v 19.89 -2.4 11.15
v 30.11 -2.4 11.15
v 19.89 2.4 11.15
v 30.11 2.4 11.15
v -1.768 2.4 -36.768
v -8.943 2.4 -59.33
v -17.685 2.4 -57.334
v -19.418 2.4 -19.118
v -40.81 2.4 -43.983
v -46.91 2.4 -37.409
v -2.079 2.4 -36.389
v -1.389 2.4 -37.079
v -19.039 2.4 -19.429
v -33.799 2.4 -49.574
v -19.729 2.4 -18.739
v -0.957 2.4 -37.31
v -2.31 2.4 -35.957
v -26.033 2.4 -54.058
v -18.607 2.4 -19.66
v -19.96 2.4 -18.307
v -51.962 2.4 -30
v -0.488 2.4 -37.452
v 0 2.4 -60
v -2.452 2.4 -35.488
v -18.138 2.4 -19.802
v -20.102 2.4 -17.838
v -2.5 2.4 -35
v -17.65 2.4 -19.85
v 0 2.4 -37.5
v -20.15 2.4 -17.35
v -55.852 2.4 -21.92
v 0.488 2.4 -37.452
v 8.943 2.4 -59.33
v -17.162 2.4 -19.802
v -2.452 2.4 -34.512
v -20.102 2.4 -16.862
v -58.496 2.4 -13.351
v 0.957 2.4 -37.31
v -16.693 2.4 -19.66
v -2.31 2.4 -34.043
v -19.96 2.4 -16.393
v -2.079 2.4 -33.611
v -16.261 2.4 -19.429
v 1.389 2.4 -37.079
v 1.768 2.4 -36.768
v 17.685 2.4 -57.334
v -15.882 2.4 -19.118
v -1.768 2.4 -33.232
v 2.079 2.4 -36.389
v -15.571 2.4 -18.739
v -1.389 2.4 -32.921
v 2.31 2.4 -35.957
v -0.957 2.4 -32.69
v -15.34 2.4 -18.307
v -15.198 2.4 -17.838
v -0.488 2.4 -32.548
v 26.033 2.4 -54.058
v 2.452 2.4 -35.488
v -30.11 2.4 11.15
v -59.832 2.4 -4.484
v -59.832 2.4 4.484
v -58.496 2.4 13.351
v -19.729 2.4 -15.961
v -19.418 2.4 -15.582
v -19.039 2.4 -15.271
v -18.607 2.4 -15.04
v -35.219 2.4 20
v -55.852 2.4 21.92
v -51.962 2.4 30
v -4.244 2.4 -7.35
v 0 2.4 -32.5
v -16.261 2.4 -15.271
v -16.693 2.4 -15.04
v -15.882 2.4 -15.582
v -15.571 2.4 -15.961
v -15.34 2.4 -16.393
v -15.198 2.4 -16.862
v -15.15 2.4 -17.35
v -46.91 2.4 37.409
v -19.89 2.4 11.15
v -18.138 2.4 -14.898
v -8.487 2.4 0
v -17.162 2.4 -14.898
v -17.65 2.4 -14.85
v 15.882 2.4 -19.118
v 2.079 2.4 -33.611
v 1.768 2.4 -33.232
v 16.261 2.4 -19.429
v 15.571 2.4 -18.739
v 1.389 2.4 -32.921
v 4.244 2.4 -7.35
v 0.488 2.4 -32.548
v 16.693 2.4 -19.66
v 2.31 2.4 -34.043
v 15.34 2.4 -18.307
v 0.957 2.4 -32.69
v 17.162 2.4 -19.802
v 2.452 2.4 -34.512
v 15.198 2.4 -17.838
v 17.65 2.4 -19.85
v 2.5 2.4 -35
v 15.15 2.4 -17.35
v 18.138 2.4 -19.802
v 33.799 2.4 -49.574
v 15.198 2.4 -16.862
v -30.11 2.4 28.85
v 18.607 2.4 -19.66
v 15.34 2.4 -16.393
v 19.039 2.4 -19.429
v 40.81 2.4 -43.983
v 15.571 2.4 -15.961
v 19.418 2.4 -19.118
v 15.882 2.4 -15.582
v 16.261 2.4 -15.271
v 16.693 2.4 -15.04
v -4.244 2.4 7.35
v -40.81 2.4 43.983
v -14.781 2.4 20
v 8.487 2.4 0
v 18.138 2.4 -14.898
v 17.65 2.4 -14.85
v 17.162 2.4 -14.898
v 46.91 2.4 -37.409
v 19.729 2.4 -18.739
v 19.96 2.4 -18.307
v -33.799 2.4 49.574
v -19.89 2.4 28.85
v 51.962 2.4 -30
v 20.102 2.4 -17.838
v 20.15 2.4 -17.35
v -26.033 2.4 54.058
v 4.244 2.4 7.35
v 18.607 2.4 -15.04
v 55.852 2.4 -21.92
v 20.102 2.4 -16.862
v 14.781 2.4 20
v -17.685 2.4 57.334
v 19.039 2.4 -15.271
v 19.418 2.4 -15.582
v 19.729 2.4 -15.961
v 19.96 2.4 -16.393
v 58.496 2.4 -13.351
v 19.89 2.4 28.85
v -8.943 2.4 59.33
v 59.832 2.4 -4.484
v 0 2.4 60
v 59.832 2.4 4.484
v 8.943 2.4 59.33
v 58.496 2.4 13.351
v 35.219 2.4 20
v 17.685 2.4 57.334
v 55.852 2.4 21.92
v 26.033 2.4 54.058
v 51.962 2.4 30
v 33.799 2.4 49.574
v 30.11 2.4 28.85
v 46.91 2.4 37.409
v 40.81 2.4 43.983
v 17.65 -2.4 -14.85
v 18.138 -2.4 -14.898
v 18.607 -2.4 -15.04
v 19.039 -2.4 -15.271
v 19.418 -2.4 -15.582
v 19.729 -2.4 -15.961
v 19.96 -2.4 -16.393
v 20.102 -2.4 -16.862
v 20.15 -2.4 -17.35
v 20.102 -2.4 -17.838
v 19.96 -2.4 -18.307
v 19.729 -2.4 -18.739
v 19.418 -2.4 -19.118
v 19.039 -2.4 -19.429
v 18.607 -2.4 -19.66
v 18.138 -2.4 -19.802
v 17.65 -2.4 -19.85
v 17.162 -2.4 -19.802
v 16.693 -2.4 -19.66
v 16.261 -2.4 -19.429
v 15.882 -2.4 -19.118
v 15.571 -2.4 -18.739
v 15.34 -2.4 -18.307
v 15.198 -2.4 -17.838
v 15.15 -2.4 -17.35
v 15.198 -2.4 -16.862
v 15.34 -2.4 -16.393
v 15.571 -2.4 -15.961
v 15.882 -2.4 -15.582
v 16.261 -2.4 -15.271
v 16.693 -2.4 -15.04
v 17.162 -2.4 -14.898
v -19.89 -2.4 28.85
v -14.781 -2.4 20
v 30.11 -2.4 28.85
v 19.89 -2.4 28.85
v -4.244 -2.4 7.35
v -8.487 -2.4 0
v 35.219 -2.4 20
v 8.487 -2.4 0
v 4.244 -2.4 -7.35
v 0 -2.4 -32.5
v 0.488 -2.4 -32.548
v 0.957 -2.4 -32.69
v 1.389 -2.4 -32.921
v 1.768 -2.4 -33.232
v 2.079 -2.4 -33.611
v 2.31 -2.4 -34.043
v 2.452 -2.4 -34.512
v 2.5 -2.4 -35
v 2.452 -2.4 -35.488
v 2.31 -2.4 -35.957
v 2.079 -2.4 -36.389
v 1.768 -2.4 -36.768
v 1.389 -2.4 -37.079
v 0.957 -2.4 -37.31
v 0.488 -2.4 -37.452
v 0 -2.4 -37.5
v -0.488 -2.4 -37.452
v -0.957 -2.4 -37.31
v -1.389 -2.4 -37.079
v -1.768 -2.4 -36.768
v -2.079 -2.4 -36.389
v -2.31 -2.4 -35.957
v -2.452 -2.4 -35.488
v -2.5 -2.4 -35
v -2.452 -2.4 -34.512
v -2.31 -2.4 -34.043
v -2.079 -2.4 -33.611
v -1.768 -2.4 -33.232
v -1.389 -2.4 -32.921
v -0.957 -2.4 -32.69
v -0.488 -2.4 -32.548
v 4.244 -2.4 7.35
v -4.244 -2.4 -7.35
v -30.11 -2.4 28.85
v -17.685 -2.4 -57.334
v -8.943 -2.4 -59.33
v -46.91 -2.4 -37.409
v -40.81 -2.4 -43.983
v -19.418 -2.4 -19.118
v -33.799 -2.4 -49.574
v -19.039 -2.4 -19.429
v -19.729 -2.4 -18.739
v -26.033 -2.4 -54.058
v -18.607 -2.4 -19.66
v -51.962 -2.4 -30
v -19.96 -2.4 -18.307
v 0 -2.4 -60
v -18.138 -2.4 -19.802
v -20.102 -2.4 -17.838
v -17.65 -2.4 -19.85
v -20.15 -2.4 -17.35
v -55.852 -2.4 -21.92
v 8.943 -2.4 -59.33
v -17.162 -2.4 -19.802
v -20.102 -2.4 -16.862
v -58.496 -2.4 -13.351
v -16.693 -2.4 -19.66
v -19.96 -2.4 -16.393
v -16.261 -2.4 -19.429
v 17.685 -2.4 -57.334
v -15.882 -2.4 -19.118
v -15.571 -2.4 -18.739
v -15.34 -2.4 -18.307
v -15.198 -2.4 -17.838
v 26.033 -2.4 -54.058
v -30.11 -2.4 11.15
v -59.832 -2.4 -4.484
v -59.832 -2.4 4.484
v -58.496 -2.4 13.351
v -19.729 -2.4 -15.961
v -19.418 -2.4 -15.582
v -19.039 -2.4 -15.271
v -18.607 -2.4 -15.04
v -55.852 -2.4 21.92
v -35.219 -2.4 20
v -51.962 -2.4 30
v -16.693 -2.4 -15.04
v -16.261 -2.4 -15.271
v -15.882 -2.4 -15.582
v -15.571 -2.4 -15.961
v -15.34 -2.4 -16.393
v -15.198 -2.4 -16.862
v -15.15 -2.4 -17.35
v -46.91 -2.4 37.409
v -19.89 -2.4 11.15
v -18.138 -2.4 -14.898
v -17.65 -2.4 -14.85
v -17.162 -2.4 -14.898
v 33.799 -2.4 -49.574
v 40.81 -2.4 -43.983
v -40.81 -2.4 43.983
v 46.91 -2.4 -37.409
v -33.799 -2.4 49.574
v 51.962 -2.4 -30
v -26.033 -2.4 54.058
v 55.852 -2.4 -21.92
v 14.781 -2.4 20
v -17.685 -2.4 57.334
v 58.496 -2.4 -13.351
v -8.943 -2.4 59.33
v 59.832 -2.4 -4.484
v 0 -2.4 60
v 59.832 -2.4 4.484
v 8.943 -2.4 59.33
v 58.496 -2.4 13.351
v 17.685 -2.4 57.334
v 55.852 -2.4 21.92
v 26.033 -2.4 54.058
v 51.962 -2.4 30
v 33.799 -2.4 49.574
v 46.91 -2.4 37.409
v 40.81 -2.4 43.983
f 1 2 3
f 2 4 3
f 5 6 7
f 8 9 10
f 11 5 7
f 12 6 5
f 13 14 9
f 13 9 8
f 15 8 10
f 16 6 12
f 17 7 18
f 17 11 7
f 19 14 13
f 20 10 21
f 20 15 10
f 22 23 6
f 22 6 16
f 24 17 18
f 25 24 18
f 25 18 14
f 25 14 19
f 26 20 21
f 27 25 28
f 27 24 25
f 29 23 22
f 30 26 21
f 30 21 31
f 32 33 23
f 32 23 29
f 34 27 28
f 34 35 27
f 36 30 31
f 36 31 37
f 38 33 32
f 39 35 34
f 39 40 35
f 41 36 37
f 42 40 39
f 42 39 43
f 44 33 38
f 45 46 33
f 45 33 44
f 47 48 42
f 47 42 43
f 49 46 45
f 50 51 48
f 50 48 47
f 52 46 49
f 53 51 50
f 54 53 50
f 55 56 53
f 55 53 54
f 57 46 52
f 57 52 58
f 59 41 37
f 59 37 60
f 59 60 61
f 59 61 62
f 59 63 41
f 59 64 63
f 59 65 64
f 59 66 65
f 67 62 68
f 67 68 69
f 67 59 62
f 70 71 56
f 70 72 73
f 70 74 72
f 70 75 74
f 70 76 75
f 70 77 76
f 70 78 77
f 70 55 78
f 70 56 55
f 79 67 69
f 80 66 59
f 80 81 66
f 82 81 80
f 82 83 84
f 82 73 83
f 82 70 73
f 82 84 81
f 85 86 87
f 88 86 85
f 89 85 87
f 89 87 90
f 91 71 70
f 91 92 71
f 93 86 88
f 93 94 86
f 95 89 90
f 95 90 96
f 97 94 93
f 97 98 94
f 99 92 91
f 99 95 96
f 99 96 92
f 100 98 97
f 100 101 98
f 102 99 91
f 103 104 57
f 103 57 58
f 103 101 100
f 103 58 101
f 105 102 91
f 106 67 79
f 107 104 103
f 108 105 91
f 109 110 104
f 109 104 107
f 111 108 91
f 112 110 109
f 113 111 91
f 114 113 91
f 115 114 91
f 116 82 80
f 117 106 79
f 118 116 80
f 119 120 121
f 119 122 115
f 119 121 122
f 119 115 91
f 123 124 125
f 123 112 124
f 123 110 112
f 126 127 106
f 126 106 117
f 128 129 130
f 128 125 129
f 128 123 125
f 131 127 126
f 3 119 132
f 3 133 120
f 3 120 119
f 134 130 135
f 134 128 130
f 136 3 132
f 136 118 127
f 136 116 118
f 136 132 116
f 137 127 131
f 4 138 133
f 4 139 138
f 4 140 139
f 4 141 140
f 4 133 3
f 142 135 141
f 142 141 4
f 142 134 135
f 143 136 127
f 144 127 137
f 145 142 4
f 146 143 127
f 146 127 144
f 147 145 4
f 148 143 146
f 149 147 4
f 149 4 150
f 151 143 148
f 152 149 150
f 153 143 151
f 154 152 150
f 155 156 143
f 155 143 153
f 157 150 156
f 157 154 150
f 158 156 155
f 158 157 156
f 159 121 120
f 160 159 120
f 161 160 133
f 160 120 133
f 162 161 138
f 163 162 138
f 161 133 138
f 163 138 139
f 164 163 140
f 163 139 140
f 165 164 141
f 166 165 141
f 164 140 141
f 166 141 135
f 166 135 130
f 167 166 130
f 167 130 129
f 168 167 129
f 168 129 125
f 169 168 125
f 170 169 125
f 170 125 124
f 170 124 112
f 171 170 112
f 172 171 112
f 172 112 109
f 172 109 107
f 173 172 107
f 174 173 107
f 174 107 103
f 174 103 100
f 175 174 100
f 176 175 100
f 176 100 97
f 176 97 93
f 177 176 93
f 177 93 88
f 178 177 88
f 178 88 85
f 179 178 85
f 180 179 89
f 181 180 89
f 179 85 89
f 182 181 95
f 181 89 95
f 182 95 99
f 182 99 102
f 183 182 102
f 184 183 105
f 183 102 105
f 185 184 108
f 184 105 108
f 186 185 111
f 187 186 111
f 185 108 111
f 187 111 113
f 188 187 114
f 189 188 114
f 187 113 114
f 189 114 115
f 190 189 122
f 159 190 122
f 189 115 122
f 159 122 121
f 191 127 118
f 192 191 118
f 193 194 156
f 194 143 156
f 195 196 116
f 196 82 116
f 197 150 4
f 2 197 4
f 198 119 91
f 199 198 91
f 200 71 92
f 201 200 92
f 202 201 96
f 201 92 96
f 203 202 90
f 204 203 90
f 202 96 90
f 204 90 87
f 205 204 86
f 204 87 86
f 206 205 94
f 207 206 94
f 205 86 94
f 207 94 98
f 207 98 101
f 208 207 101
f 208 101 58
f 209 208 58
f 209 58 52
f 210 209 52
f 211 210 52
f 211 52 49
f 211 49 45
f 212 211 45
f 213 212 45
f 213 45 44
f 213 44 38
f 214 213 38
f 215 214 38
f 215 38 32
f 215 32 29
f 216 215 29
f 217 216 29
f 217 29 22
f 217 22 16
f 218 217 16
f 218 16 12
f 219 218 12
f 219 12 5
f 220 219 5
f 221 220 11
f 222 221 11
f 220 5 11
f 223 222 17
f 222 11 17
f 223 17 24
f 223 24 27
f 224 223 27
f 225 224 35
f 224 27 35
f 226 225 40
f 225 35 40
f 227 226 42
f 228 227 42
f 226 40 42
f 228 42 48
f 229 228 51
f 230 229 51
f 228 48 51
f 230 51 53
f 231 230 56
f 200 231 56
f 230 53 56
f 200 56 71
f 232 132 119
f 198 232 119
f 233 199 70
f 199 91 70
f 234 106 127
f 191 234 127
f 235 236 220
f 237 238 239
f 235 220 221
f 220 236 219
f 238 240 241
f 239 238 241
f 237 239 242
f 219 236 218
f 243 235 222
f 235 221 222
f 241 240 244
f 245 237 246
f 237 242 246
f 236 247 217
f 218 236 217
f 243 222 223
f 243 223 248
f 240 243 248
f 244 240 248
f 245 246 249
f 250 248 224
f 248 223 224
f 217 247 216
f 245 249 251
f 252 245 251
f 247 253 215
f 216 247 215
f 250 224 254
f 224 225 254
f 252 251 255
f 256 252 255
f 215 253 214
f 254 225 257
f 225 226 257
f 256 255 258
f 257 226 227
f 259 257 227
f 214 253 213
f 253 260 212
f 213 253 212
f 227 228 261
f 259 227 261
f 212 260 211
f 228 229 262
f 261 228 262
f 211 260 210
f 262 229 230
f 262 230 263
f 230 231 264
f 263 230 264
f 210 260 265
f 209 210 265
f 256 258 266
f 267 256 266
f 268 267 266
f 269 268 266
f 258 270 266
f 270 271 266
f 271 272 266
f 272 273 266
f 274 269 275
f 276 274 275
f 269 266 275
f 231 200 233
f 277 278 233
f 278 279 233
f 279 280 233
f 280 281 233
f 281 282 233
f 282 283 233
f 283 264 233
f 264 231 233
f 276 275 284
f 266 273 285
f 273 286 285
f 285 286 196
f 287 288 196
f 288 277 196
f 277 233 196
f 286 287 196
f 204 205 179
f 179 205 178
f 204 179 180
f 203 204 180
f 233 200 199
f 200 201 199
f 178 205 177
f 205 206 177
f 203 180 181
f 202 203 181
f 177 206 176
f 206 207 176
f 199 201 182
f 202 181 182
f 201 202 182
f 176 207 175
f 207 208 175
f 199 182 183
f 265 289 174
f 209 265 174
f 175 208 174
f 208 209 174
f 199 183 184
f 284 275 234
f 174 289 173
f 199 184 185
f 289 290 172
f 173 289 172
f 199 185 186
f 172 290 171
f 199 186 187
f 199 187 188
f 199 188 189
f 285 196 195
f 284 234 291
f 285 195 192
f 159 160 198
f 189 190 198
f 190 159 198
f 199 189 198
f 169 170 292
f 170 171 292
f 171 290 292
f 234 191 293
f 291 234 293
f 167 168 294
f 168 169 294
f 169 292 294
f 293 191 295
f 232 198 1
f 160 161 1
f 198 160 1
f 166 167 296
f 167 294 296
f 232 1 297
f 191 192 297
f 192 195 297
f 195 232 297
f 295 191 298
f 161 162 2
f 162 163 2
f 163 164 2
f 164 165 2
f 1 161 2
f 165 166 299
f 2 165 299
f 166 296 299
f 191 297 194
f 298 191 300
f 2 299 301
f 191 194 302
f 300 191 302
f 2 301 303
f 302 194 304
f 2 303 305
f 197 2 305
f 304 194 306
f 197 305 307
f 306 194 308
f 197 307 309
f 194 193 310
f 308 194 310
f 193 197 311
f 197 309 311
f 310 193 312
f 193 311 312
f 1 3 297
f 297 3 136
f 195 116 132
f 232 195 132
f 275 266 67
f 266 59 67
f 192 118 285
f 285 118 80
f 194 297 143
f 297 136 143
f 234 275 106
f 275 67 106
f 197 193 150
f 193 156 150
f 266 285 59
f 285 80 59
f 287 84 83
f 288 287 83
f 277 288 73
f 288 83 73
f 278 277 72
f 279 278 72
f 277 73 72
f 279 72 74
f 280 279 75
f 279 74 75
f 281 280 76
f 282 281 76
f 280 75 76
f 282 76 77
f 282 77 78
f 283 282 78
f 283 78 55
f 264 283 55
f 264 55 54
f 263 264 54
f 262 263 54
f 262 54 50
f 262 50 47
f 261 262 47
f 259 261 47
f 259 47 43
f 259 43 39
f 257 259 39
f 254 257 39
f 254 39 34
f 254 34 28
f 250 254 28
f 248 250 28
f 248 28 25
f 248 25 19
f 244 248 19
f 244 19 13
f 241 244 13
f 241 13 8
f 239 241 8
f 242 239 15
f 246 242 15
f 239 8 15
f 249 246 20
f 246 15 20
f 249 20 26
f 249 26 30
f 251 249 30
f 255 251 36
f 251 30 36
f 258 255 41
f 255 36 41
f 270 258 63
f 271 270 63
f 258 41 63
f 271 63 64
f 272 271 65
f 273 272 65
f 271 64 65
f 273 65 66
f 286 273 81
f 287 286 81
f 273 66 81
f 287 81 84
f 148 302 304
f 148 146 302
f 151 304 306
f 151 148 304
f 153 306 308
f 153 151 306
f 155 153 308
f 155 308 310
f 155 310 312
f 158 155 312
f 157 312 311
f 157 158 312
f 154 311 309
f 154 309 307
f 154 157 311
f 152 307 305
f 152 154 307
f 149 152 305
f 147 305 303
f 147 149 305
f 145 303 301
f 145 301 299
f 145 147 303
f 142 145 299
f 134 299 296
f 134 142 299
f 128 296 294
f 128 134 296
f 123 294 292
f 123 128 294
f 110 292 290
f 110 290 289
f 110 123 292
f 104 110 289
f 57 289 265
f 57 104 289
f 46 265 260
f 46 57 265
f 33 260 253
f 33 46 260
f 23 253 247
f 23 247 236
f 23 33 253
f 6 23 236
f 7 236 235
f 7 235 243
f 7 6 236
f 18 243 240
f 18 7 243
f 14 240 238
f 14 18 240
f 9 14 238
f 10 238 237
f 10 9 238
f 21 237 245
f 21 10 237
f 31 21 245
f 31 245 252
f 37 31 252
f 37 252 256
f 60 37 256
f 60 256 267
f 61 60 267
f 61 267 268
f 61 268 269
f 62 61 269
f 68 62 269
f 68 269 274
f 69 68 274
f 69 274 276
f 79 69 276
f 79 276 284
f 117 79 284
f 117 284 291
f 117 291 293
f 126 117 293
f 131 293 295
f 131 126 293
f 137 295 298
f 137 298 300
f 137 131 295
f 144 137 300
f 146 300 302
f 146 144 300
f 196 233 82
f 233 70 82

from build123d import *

# Parameters (mm, degrees)
SKETCH1_R           = 60
BOSS_EXTRUDE1_DEPTH = 2.4
SKETCH2_R           = 2.5
CUT_EXTRUDE1_DEPTH  = 85.988469806


with BuildPart() as part:
    # Sketch1 → Boss-Extrude1 (new, symmetric)
    with BuildSketch(Plane(origin=(0, 0, 0), x_dir=(1, 0, 0), z_dir=(0, 1, 0))):
        with Locations(Location((0, 0, 0), (0, 0, 270))):
            Circle(SKETCH1_R)
        Polygon((8.487048957, 0), (4.243524479, 7.35), (-4.243524479, 7.35), (-8.487048957, 0), (-4.243524479, -7.35), (4.243524479, -7.35), align=None, mode=Mode.SUBTRACT)
        Polygon((-14.780900235, -20), (-19.890450118, -11.15), (-30.109549882, -11.15), (-35.219099765, -20), (-30.109549882, -28.85), (-19.890450118, -28.85), align=None, mode=Mode.SUBTRACT)
        Polygon((35.219099765, -20), (30.109549882, -11.15), (19.890450118, -11.15), (14.780900235, -20), (19.890450118, -28.85), (30.109549882, -28.85), align=None, mode=Mode.SUBTRACT)
    extrude(amount=BOSS_EXTRUDE1_DEPTH, both=True)

    # Sketch2 → Cut-Extrude1 (cut, through all)
    with BuildSketch(Plane(origin=(0, 2.4, 0), x_dir=(1, 0, 0), z_dir=(0, 1, 0))):
        with Locations(Location((0, 35, 0), (0, 0, 270))):
            Circle(SKETCH2_R)
        with Locations(Location((17.65, 17.35, 0), (0, 0, 270))):
            Circle(SKETCH2_R)
        with Locations(Location((-17.65, 17.35, 0), (0, 0, 270))):
            Circle(SKETCH2_R)
    extrude(amount=-CUT_EXTRUDE1_DEPTH, mode=Mode.SUBTRACT)


solid = part.part
